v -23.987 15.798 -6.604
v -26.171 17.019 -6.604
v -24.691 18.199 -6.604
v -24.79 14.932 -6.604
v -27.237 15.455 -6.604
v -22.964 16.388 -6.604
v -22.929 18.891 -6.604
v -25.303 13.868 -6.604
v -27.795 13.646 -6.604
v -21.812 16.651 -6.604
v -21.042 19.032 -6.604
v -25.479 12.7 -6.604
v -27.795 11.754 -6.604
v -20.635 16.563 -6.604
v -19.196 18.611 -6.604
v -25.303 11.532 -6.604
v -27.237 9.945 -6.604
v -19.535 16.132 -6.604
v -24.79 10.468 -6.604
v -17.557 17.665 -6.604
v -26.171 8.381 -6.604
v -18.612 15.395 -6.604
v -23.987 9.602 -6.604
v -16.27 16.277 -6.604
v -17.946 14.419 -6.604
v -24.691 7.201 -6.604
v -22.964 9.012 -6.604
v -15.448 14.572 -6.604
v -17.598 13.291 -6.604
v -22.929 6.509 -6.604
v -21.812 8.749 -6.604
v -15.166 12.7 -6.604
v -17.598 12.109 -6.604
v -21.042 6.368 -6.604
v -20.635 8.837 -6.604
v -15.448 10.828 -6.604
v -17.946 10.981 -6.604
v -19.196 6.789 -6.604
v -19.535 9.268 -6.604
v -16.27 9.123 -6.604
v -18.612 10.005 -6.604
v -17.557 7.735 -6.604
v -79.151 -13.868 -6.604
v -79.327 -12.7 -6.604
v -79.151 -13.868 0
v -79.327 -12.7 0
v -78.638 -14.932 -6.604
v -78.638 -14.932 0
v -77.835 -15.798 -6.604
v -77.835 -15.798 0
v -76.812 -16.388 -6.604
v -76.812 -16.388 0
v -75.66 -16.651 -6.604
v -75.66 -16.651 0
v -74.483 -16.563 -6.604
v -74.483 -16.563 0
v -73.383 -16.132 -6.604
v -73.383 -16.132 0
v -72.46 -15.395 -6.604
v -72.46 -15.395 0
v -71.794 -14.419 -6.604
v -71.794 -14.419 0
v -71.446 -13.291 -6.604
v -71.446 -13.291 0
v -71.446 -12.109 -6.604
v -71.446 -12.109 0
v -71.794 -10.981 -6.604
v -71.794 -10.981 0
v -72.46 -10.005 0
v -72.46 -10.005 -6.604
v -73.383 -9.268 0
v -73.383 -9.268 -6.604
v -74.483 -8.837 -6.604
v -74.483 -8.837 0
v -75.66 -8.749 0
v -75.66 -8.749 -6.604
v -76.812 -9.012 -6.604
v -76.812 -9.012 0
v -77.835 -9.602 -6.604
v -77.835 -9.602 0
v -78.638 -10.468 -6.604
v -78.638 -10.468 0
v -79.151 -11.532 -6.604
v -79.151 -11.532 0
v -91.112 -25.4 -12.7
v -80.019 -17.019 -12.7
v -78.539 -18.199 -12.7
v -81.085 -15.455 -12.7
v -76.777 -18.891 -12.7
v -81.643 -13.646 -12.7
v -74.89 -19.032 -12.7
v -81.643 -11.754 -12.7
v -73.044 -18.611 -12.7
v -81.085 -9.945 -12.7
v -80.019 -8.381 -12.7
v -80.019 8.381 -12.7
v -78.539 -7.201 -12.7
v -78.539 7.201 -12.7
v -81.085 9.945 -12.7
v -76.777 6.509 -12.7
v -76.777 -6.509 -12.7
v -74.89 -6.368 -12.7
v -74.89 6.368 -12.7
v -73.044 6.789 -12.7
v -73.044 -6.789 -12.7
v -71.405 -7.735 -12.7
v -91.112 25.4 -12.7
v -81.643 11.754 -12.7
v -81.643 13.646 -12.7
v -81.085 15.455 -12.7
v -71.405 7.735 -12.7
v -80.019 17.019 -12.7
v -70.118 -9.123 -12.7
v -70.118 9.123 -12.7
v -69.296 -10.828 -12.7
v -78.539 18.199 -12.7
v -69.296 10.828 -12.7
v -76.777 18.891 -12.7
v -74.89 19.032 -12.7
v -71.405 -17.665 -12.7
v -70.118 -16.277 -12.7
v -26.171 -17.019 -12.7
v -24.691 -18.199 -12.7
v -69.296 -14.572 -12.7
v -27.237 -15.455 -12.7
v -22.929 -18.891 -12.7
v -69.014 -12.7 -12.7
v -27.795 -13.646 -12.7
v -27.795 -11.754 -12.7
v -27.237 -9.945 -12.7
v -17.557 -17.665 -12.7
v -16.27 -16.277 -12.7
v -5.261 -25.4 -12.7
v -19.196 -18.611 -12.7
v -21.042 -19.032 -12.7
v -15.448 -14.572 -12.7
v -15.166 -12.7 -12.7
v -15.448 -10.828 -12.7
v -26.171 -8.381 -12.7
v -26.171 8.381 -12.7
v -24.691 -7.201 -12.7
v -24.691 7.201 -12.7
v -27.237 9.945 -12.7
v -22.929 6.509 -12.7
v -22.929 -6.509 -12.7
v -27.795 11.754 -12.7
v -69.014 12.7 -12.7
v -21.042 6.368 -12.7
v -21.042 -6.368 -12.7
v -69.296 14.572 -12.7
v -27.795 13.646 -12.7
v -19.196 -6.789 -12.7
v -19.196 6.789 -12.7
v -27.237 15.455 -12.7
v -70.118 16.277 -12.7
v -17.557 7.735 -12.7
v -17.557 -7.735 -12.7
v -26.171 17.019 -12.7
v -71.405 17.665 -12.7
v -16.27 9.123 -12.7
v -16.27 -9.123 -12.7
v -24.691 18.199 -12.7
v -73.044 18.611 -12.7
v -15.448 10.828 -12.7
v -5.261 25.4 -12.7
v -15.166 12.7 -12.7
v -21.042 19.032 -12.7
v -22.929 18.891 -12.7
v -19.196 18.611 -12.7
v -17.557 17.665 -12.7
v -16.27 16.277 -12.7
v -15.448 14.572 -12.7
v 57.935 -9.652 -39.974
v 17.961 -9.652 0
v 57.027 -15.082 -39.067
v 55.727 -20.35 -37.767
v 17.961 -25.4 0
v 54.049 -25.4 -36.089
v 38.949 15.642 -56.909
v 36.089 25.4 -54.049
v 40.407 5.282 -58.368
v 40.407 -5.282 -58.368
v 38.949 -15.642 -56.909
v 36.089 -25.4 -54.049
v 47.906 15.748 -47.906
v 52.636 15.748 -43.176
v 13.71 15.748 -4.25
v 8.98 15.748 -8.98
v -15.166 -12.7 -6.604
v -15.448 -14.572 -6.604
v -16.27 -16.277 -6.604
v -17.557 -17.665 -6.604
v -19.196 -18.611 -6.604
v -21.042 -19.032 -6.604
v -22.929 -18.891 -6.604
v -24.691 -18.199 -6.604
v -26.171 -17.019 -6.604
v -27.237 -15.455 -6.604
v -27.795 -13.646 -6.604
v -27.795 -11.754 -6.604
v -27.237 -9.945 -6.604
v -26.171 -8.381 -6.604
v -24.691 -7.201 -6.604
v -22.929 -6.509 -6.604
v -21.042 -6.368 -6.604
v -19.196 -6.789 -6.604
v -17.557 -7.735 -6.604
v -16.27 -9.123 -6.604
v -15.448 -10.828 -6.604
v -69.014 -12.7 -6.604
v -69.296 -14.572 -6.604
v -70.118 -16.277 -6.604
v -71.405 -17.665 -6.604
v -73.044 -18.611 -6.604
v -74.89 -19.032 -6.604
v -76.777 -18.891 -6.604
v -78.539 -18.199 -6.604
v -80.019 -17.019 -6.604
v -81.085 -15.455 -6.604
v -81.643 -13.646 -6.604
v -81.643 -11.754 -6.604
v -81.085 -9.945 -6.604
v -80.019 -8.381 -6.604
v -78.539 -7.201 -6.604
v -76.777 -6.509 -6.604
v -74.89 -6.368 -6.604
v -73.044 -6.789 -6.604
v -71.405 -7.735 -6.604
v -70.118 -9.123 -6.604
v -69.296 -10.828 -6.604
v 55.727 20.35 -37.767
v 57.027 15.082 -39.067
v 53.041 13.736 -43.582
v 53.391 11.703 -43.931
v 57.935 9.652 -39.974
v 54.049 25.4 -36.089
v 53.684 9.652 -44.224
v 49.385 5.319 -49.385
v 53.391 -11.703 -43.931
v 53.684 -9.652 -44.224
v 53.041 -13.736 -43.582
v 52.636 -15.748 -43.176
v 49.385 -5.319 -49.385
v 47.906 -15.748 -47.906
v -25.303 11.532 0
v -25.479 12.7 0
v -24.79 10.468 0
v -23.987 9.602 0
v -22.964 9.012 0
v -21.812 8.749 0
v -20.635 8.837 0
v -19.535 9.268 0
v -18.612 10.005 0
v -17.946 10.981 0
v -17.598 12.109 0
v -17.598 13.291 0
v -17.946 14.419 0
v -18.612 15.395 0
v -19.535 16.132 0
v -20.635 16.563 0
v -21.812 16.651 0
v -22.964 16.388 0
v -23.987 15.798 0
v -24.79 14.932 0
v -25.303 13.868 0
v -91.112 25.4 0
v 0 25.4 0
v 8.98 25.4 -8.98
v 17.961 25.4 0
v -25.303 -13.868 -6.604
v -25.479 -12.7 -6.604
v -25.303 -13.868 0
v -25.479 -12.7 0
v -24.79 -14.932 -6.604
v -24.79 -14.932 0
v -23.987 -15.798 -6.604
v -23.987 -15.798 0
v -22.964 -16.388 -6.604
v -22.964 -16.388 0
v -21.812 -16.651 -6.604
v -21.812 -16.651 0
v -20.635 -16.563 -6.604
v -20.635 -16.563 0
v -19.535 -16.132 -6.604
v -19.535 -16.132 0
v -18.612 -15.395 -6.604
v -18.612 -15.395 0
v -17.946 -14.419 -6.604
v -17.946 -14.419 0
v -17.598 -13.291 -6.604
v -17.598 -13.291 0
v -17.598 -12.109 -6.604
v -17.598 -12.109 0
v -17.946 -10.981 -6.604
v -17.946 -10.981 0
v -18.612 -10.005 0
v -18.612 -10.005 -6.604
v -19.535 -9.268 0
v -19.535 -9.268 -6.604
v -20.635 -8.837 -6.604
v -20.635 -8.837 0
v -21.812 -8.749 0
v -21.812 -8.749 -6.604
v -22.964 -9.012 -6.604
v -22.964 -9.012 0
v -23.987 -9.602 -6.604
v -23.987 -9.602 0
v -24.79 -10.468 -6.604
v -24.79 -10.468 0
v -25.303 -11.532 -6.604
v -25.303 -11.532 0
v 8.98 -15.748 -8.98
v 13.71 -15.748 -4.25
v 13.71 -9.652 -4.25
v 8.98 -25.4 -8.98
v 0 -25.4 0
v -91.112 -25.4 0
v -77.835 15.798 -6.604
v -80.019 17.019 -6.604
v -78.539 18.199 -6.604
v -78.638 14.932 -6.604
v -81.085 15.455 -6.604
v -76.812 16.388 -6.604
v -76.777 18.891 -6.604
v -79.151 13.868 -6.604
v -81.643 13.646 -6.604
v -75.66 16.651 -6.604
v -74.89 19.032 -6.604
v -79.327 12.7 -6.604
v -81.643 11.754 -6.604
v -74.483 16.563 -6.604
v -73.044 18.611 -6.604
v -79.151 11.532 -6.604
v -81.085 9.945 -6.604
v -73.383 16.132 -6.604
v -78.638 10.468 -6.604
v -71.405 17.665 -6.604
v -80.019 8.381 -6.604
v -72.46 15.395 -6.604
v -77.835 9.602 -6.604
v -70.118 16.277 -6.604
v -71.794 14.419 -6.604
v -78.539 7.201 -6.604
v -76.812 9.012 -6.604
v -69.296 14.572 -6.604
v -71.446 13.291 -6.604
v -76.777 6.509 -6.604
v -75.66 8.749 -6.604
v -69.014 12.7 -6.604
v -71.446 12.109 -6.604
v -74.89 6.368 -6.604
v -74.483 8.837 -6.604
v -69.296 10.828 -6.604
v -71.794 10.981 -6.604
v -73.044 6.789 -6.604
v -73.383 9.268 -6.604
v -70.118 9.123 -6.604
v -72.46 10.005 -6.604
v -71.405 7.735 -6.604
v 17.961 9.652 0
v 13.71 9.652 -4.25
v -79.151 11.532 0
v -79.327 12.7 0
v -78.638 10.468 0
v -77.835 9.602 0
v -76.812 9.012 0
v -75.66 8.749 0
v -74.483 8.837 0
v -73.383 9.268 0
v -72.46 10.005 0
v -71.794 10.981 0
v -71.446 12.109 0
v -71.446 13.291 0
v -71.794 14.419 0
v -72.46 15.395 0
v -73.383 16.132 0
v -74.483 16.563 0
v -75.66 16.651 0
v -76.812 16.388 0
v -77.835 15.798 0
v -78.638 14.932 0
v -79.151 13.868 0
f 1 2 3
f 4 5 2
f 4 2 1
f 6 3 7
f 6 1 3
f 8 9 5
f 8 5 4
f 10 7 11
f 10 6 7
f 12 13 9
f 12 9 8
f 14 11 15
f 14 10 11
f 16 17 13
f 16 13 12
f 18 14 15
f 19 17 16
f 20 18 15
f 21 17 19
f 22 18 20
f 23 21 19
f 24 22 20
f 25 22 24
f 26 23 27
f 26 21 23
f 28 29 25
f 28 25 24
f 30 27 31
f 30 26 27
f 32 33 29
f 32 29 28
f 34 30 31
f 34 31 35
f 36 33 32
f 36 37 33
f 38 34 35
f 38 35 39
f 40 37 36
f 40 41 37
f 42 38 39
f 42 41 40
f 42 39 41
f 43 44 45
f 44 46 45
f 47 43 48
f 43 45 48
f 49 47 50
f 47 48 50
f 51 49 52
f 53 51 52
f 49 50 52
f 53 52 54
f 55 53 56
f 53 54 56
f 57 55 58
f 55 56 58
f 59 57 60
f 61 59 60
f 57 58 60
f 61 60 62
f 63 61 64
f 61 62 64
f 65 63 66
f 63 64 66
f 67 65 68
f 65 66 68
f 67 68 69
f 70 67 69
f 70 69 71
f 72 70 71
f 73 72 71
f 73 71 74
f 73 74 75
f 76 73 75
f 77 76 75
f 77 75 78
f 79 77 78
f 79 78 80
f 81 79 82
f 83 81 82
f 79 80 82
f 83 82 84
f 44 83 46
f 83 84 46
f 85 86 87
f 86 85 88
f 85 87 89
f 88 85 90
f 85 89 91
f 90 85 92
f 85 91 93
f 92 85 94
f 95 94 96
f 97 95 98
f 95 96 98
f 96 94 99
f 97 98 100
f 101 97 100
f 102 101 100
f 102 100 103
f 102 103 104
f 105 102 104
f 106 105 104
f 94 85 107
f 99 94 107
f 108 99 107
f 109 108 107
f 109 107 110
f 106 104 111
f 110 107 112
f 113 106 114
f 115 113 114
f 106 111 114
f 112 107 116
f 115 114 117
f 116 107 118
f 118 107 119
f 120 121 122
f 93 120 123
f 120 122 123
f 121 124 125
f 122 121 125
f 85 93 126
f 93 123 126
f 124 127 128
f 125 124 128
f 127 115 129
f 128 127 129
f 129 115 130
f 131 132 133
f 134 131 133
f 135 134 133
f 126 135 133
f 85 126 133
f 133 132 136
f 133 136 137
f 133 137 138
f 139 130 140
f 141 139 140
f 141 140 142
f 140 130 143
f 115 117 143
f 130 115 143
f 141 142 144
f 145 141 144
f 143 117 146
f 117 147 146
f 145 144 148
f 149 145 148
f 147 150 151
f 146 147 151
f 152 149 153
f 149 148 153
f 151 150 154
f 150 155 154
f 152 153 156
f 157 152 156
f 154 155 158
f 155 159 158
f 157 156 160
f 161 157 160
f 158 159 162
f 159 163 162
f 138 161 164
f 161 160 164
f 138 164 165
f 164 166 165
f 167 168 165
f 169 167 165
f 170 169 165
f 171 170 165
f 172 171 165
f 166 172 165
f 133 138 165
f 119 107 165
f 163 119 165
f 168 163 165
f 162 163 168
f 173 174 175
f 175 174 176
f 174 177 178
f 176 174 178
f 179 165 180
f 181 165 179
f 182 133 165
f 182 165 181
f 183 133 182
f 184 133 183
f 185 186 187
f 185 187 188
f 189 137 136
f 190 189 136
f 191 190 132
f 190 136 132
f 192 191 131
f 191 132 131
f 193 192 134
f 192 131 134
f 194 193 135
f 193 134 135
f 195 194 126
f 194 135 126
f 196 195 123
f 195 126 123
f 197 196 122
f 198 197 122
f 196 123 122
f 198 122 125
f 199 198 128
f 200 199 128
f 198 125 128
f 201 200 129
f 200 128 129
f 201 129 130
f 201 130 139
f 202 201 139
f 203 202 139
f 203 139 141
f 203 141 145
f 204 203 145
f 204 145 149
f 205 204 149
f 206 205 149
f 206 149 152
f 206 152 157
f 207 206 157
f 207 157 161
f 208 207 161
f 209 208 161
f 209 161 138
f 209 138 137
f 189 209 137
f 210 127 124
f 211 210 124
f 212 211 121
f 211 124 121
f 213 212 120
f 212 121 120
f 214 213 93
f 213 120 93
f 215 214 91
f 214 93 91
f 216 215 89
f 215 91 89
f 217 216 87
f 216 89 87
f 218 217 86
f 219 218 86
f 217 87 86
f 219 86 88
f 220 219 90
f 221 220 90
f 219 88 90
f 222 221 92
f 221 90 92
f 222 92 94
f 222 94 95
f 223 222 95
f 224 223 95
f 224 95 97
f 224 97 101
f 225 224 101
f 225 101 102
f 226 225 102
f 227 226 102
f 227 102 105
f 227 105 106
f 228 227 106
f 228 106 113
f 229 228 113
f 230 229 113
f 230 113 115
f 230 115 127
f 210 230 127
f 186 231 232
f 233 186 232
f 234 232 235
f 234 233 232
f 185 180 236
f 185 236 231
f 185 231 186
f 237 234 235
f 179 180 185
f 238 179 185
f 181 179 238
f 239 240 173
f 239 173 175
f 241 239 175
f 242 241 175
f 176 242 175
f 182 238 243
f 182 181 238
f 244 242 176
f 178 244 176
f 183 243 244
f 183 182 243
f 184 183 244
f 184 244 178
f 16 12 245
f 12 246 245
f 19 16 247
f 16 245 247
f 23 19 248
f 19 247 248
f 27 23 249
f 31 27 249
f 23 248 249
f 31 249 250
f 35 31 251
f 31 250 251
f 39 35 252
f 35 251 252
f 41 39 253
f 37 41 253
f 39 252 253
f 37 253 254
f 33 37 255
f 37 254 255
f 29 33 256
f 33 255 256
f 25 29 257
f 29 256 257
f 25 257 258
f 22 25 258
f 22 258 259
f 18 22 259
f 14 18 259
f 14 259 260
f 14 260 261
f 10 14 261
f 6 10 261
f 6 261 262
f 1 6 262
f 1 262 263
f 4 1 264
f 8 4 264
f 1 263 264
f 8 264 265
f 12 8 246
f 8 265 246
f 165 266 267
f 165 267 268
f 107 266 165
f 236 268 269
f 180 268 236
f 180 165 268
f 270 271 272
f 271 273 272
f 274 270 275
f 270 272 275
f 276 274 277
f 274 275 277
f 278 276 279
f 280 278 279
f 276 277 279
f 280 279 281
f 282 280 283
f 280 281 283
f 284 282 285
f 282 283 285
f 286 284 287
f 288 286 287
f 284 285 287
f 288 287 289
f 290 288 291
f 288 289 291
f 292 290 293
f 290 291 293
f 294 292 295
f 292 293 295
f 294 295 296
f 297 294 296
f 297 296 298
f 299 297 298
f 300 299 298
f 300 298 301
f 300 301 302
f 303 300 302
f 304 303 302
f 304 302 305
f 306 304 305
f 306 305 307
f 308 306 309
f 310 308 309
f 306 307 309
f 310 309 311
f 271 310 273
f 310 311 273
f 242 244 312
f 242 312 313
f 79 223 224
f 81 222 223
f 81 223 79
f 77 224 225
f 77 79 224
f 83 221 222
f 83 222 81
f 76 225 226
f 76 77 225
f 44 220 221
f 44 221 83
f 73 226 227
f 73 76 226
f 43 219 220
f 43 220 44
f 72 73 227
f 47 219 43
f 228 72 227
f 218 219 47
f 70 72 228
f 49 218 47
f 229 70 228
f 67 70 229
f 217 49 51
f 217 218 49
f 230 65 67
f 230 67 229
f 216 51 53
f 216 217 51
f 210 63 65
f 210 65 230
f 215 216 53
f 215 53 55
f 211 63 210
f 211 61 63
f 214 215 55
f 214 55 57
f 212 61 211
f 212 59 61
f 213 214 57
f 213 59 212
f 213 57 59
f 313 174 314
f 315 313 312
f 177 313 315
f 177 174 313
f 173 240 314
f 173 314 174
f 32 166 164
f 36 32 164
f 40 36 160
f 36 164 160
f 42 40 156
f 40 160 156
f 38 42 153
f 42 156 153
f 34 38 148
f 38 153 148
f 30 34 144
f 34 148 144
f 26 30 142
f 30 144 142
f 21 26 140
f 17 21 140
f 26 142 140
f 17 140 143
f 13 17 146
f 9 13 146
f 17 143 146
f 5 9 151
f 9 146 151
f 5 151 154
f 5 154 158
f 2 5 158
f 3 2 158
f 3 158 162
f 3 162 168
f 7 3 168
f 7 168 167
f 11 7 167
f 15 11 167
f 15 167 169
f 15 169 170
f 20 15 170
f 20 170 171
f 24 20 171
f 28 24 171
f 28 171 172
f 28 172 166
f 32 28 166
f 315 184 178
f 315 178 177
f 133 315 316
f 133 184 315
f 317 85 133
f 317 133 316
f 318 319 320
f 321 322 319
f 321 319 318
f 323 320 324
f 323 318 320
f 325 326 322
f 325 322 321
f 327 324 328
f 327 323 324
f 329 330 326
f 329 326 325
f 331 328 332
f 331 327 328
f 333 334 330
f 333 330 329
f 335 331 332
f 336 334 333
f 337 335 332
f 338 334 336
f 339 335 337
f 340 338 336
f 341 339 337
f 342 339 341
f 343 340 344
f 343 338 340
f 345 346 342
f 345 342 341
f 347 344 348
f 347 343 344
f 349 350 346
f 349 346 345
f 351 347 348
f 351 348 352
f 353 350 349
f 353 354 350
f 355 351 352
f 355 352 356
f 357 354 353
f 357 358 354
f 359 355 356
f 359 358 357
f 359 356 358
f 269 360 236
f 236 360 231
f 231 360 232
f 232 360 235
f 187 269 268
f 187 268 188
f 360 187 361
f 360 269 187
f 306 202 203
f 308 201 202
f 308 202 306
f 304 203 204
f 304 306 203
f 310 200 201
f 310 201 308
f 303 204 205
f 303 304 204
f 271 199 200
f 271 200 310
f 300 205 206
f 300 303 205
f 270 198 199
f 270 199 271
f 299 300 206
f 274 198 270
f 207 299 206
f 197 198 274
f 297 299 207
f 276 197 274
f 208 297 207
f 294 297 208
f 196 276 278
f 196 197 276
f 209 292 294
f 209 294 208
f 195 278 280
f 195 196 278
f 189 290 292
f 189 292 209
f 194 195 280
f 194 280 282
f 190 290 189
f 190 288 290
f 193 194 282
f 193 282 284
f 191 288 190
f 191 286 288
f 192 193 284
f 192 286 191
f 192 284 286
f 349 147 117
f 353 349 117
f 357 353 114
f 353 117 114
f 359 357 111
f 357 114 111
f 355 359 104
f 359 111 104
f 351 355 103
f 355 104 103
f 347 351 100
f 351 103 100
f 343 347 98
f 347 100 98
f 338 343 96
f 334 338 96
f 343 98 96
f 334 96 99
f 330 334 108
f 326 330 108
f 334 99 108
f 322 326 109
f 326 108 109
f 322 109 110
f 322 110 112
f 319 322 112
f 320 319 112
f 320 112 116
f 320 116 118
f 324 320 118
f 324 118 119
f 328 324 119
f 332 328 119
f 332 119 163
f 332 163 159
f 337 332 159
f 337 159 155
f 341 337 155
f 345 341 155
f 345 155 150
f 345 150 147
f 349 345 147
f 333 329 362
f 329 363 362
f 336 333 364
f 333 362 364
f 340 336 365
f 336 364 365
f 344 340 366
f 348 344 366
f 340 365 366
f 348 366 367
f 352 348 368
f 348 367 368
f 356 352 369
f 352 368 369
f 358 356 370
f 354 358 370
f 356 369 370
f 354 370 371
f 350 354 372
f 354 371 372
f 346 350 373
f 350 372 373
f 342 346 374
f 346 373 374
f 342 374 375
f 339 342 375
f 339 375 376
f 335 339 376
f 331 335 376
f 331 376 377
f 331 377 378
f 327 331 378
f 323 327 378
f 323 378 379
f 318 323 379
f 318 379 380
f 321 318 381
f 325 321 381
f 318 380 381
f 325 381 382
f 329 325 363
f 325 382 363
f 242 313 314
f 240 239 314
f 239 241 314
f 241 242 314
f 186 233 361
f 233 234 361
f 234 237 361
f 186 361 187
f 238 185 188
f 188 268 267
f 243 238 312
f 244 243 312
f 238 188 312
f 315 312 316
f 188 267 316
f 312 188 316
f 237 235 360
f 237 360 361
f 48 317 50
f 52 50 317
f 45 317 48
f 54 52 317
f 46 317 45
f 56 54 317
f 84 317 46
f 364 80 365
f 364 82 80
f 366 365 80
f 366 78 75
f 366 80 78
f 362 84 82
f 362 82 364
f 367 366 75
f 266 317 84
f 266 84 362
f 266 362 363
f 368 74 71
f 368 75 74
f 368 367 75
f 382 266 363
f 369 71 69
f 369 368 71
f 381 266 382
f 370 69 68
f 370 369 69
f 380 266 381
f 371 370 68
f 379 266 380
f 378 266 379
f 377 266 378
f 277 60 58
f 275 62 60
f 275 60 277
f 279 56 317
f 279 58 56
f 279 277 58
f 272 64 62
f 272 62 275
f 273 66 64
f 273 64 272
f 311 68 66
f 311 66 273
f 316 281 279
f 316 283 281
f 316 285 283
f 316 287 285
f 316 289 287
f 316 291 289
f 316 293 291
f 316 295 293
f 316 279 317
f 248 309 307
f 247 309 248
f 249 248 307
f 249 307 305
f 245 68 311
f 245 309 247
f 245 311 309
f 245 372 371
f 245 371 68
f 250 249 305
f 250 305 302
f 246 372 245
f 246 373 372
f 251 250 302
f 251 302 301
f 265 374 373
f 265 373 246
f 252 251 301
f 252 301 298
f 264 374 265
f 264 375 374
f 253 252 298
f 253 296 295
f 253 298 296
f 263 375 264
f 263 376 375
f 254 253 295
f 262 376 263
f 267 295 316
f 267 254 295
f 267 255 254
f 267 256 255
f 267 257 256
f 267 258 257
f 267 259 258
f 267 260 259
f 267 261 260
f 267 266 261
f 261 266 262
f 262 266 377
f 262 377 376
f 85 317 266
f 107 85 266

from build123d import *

# Parameters (mm, degrees)
F0_W           = 91.11234
F0_H           = 50.8
F3_DEPTH       = 12.7
F4_DEPTH       = 12.7
F6_DEPTH       = 82.805
F7_DEPTH       = 12.7
F9_D           = 7.9248
F9_CBORE_D     = 12.7
F9_CBORE_DEPTH = 6.096


with BuildPart() as f3:
    # F0 (on Top) → F3 (new body)
    with BuildSketch(Plane.XY):
        with Locations((-45.55617, 0)):
            Rectangle(F0_W, F0_H)
    extrude(amount=-F3_DEPTH)

    # F2 (on line) → F4 (join, symmetric)
    with BuildSketch(Plane(origin=(0, 0, 0), x_dir=(0.7071067812, 0, -0.7071067812), z_dir=(-0.7071067812, 0, -0.7071067812))):
        with BuildLine():
            Line((63.7370183547, 25.4), (0, 25.4))
            Line((0, 25.4), (0, -25.4))
            Line((0, -25.4), (63.7370183547, -25.4))
            ThreePointArc((63.7370183547, -25.4), (70.104, 0), (63.7370183547, 25.4))
        make_face()
    extrude(amount=F4_DEPTH, both=True)

    # F5 (on face) → F6 (cut, through all)
    with BuildSketch(Plane(origin=(0, 0, 0), x_dir=(0, -1, 0), z_dir=(-0.7071067812, 0, 0.7071067812))):
        Polygon((-15.748, 6.6890539291), (-15.748, 0), (15.748, 0), (15.748, 6.6890539291), (9.6519063121, 6.6890539291), (9.6519063121, 12.7), (-9.6519063121, 12.7), (-9.6519063121, 6.6890539291), align=None)
    extrude(amount=-F6_DEPTH, mode=Mode.SUBTRACT)

    # F5 (on face) → F7 (cut)
    with BuildSketch(Plane(origin=(0, 0, 0), x_dir=(0, -1, 0), z_dir=(-0.7071067812, 0, 0.7071067812))):
        Polygon((-25.4, 12.7), (-25.4, 0), (-15.748, 0), (-15.748, 6.6890539291), (-9.6519063121, 6.6890539291), (-9.6519063121, 12.7), align=None)
        Polygon((15.748, 6.6890539291), (15.748, 0), (25.4, 0), (25.4, 12.7), (9.6519063121, 12.7), (9.6519063121, 6.6890539291), align=None)
    extrude(amount=-F7_DEPTH, mode=Mode.SUBTRACT)

    # F9 (through all)
    with Locations(Plane(origin=(0, 0, -12.7), x_dir=(1, 0, 0), z_dir=(0, 0, -1))):
        with Locations((-75.36434, 12.7), (-75.36434, -12.7), (-21.51634, 12.7), (-21.51634, -12.7)):
            CounterBoreHole(F9_D / 2, F9_CBORE_D / 2, F9_CBORE_DEPTH)


solid = f3.part
